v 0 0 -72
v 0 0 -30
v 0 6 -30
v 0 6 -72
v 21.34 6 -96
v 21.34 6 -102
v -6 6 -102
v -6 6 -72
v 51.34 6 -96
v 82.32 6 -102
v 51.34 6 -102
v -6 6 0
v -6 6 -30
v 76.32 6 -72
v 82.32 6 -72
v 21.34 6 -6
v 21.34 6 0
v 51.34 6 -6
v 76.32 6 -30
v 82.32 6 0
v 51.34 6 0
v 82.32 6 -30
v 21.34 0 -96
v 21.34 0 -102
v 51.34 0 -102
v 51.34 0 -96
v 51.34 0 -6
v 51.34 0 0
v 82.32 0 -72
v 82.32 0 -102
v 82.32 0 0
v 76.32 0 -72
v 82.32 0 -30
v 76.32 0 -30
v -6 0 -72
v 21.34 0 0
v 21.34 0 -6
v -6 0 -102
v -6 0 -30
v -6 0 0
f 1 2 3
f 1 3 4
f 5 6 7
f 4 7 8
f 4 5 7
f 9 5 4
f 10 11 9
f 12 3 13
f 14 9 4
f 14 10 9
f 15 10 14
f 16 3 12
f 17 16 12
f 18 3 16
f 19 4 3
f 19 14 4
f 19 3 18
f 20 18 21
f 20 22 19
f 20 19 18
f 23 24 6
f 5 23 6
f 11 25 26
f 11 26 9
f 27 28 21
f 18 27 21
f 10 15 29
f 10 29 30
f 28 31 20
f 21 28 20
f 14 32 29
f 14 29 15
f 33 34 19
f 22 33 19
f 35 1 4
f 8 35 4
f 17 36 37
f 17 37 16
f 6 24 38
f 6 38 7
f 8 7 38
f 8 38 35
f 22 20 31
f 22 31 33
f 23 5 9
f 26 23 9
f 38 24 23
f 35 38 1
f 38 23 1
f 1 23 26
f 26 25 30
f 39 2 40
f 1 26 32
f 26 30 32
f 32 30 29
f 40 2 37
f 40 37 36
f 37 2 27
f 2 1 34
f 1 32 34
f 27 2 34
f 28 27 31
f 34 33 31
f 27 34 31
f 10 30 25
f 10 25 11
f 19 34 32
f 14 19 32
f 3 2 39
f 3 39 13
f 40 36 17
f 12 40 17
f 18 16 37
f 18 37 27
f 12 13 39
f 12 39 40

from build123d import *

# Parameters (mm, degrees)
SKETCH1_W           = 76.32
SKETCH1_H           = 102
BOSS_EXTRUDE1_DEPTH = 6
SKETCH2_W           = 30
SKETCH2_H           = 6
BOSS_EXTRUDE2_DEPTH = 6
LPATTERN1_COUNT     = 2
LPATTERN1_PITCH     = 72
SKETCH4_W           = 30
SKETCH4_H           = 6
BOSS_EXTRUDE3_DEPTH = 6
LPATTERN2_COUNT     = 2
LPATTERN2_PITCH     = 72
SKETCH5_W           = 30
SKETCH5_H           = 6
CUT_EXTRUDE1_DEPTH  = 6


with BuildPart() as part:
    # Sketch1 → Boss-Extrude1 (new body)
    with BuildSketch(Plane(origin=(0, 0, 0), x_dir=(1, 0, 0), z_dir=(0, 1, 0))):
        with Locations((38.16, 51)):
            Rectangle(SKETCH1_W, SKETCH1_H)
    extrude(amount=BOSS_EXTRUDE1_DEPTH)

    # Sketch2 → Boss-Extrude2 (add)
    with BuildSketch(Plane(origin=(76.32, 0, 0), x_dir=(0, 0, -1), z_dir=(1, 0, 0))):
        with Locations((15, 3)):
            Rectangle(SKETCH2_W, SKETCH2_H)
    boss_extrude2 = extrude(amount=BOSS_EXTRUDE2_DEPTH)

    # LPattern1: Boss-Extrude2 ×2
    with Locations(*[(0, 0, -i * LPATTERN1_PITCH) for i in range(1, LPATTERN1_COUNT)]):
        add(boss_extrude2)

    # Sketch4 → Boss-Extrude3 (add)
    with BuildSketch(Plane.ZY):
        with Locations((-87, 3)):
            Rectangle(SKETCH4_W, SKETCH4_H)
    boss_extrude3 = extrude(amount=BOSS_EXTRUDE3_DEPTH)

    # LPattern2: Boss-Extrude3 ×2
    with Locations(*[(0, 0, i * LPATTERN2_PITCH) for i in range(1, LPATTERN2_COUNT)]):
        add(boss_extrude3)

    # Sketch5 → Cut-Extrude1 (cut)
    with BuildSketch(Plane.XY):
        with Locations((36.34, 3)):
            Rectangle(SKETCH5_W, SKETCH5_H)
    cut_extrude1 = extrude(amount=-CUT_EXTRUDE1_DEPTH, mode=Mode.SUBTRACT)

    # Mirror1: Cut-Extrude1 across plane
    add(cut_extrude1.mirror(Plane(origin=(0, 0, -51), x_dir=(1, 0, 0), z_dir=(0, 0, -1))), mode=Mode.SUBTRACT)


solid = part.part
